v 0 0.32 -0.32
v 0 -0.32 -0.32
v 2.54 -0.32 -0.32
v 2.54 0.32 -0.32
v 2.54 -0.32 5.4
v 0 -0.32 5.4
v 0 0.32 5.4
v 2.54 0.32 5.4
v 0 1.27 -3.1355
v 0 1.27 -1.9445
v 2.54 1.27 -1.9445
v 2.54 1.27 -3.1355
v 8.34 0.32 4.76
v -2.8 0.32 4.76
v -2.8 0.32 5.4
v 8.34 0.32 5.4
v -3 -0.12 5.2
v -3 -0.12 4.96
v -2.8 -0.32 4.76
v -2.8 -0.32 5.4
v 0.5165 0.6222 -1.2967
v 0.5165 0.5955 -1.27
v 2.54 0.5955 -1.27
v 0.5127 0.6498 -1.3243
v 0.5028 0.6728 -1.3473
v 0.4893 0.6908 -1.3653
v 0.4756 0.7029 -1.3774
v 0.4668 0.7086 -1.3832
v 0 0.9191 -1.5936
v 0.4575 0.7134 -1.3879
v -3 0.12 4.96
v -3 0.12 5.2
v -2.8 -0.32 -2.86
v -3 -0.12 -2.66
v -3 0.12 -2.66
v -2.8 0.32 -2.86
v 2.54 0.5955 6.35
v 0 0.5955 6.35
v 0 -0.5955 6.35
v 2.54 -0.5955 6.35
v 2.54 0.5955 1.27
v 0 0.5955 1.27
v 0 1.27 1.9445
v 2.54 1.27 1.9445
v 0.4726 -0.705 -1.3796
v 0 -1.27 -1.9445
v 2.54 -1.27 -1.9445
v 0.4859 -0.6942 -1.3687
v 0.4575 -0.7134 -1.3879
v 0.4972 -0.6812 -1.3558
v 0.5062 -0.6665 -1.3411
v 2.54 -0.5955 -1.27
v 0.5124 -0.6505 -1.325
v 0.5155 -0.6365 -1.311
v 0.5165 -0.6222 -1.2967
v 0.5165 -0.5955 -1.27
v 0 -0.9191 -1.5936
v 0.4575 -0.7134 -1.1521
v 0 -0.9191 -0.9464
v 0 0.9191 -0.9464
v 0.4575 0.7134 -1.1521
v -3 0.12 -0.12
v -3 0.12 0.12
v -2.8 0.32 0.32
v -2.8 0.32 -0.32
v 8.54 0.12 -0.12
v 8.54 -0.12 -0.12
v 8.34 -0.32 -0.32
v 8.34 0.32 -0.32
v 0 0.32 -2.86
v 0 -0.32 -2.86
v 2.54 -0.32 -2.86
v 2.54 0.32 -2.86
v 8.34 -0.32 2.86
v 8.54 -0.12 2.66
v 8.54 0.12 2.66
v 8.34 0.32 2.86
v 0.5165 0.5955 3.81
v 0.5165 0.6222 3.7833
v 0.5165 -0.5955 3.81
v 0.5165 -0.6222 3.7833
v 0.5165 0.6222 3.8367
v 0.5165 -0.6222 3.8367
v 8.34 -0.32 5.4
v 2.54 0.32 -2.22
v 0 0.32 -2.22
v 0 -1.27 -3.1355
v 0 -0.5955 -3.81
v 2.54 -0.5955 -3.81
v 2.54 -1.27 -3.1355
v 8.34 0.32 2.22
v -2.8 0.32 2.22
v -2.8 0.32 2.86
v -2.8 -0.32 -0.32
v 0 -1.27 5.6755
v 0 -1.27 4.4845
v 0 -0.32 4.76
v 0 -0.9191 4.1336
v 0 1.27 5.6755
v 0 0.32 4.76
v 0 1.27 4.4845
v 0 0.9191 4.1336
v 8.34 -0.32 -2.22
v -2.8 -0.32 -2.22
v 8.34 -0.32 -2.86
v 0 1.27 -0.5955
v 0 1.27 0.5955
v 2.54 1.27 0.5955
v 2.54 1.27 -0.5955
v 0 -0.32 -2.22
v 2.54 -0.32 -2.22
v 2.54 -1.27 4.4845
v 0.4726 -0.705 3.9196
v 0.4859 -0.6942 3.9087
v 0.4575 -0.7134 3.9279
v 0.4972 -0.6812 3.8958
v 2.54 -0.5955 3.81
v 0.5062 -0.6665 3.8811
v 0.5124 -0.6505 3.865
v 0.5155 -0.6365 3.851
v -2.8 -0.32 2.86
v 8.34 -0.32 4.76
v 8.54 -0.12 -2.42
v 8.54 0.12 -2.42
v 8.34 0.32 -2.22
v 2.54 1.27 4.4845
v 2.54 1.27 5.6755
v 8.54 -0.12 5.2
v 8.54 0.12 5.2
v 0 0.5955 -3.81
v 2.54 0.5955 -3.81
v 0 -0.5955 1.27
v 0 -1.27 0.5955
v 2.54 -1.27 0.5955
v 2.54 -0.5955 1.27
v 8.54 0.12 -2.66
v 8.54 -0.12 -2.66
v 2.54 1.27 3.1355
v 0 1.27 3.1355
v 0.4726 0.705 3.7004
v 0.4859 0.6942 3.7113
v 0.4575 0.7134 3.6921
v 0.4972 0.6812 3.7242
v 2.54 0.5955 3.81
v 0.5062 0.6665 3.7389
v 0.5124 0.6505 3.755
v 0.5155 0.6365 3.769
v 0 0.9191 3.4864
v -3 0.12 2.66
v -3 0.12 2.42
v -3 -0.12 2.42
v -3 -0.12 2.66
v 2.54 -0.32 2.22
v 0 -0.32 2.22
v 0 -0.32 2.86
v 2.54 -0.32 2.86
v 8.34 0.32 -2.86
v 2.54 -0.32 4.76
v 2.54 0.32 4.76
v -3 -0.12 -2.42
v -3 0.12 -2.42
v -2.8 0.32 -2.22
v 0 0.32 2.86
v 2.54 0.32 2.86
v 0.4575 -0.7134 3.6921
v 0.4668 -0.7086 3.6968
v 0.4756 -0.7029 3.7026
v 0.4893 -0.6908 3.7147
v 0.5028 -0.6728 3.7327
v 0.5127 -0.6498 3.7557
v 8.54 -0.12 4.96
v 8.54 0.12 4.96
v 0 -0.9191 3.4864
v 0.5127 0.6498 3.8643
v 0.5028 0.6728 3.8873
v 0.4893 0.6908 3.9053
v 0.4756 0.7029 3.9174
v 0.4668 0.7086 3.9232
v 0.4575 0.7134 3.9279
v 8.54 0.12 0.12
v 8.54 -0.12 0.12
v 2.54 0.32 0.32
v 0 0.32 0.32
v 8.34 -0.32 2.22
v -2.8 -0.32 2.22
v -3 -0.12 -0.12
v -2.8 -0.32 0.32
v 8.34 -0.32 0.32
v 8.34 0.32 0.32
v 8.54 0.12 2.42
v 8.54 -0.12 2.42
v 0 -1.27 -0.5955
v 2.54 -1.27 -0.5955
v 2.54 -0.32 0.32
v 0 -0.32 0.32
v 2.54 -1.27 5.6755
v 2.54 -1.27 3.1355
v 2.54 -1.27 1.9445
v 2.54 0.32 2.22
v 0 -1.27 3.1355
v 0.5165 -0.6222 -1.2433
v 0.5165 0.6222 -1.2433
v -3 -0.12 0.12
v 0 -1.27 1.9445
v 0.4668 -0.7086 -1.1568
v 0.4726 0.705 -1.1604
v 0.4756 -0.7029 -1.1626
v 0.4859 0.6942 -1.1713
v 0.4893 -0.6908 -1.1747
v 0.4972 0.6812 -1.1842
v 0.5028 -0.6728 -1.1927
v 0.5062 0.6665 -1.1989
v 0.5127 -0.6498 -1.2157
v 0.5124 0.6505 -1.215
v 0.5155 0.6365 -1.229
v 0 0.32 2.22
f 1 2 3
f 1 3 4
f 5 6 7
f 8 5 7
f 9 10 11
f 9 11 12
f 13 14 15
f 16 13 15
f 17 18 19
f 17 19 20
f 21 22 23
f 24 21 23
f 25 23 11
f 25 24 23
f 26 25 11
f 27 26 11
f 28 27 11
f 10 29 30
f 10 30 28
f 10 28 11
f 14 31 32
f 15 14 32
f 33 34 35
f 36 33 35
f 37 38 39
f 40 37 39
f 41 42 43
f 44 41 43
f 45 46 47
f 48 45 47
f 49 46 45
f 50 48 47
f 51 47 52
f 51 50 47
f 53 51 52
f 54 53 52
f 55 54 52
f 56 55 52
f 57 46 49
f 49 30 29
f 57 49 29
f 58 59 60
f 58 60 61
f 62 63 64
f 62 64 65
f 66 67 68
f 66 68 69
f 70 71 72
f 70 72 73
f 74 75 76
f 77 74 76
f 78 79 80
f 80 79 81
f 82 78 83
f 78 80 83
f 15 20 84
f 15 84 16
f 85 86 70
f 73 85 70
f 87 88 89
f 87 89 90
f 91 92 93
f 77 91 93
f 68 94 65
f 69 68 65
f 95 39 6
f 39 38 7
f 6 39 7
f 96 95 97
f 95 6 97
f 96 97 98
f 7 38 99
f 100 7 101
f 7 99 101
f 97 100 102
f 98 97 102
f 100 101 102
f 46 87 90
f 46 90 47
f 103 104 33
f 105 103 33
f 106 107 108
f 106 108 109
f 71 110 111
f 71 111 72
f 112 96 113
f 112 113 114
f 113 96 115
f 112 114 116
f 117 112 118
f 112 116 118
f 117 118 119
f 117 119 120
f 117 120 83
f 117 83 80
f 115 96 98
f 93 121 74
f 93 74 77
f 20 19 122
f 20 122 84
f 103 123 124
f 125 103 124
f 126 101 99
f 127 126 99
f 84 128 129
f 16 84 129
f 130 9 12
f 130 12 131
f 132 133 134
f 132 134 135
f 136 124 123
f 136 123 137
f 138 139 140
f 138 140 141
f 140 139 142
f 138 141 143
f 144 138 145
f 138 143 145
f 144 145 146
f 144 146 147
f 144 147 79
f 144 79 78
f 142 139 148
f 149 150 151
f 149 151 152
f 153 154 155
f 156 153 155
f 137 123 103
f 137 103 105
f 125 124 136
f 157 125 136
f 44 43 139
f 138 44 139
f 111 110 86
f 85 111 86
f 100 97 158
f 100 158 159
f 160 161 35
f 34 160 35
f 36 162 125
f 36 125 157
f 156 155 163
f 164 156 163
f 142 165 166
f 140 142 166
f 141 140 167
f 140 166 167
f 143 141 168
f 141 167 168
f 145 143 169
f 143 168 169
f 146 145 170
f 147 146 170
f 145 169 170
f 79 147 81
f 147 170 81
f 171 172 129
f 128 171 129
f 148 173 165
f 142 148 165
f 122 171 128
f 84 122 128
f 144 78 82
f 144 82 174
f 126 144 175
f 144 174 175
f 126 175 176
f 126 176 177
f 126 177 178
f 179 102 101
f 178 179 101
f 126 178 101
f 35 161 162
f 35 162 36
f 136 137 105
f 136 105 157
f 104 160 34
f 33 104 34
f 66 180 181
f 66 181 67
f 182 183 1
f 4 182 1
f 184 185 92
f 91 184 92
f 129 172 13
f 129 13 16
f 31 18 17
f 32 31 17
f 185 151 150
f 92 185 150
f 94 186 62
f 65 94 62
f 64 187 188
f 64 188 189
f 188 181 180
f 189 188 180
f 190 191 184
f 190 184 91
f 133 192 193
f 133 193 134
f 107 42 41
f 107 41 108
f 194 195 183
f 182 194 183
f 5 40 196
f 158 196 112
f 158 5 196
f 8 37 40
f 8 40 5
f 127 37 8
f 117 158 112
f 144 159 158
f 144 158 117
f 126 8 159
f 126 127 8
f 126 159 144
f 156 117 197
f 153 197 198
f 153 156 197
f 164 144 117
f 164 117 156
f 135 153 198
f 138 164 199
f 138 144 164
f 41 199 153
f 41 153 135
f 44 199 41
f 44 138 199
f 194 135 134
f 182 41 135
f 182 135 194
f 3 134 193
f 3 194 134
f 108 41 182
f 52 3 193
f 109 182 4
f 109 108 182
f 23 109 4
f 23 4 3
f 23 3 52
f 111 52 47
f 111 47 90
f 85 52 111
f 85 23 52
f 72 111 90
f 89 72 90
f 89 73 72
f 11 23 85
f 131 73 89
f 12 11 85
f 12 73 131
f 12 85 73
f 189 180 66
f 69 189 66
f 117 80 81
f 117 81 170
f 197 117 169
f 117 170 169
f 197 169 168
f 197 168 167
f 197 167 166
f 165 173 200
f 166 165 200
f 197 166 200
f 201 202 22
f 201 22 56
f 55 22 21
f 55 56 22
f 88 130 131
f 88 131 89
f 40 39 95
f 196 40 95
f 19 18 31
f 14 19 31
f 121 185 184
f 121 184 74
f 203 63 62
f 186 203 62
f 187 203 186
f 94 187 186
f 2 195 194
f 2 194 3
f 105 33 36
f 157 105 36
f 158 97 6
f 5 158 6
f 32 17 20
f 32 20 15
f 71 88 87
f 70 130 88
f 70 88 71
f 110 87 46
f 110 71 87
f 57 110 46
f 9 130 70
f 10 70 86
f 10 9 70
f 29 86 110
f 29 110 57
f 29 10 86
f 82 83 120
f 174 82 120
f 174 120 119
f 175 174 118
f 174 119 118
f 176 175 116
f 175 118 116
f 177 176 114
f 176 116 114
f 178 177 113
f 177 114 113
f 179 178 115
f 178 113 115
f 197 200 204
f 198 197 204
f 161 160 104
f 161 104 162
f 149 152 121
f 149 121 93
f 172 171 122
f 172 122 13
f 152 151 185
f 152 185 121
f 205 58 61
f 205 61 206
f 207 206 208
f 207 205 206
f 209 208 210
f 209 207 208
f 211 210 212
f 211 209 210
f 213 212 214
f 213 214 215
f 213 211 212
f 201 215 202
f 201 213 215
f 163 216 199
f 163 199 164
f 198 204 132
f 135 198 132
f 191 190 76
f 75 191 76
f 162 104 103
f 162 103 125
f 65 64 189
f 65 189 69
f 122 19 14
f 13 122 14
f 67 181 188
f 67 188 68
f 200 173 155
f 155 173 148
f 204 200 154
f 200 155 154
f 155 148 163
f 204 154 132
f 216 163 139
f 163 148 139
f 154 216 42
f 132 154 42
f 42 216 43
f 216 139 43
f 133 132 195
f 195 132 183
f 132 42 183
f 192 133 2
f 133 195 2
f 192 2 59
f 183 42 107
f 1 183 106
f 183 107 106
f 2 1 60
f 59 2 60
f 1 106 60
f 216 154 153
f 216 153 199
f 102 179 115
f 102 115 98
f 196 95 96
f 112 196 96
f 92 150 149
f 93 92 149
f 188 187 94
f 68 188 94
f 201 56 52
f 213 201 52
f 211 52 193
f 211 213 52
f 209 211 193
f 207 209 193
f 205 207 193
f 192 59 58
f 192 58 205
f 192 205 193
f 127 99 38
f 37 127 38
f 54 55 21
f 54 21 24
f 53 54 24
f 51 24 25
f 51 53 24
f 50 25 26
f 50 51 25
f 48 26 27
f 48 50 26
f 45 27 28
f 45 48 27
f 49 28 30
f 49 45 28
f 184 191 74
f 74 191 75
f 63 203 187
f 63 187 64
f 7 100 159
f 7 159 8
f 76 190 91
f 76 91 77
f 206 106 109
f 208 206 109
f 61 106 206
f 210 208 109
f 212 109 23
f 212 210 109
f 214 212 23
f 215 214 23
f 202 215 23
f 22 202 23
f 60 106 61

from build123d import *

# Parameters (mm, degrees)
CROQUIS1_W                     = 0.64
CROQUIS1_H                     = 0.64
SALIENTE_EXTRUIR1_DEPTH        = 2.54
CORTAR_EXTRUIR1_DEPTH          = 2.54
CORTAR_EXTRUIR1_DEPTH_BACK     = 2.54
SALIENTE_EXTRUIR2_DEPTH        = 8.54
SALIENTE_EXTRUIR2_DEPTH_BACK   = 3
CROQUIS3_W                     = 0.64
CROQUIS3_H                     = 0.64
SALIENTE_EXTRUIR2_2_DEPTH      = 8.54
SALIENTE_EXTRUIR2_2_DEPTH_BACK = 3
CHAFL_N1_SIZE                  = 0.2
CHAFL_N2_SIZE                  = 0.2


with BuildPart() as part:
    # Croquis1 → Saliente-Extruir1 (new body)
    # profile 1 of 2: a face of its own
    with BuildSketch(Plane(origin=(0, 0, 0), x_dir=(0, 0, -1), z_dir=(1, 0, 0))):
        Polygon((1.27, 0.595482683), (1.27, -0.595482683), (0.595482683, -1.27), (-0.595482683, -1.27), (-1.27, -0.595482683), (-1.27, 0.595482683), (-0.595482683, 1.27), (0.595482683, 1.27), align=None)
        Rectangle(CROQUIS1_W, CROQUIS1_H, mode=Mode.SUBTRACT)
    # profile 2 of 2: a face of its own
    with BuildSketch(Plane(origin=(0, 0, 0), x_dir=(0, 0, -1), z_dir=(1, 0, 0))):
        Polygon((3.135482683, 1.27), (3.81, 0.595482683), (3.81, -0.595482683), (3.135482683, -1.27), (1.944517317, -1.27), (1.27, -0.595482683), (1.27, 0.595482683), (1.944517317, 1.27), align=None)
        with Locations((2.54, 0)):
            Rectangle(CROQUIS1_W, CROQUIS1_H, mode=Mode.SUBTRACT)
    extrude(amount=SALIENTE_EXTRUIR1_DEPTH)

    # Croquis2 → Cortar-Extruir1 (cut, two sides: drawn at the far end of the back side and taken through both)
    with BuildSketch(Plane(origin=(0, 0, 0), x_dir=(1, 0, 0), z_dir=(0, 1, 0)).offset(-CORTAR_EXTRUIR1_DEPTH_BACK)):
        with BuildLine():
            Line((0.516526244, 1.243275937), (0.516526244, 1.296724063))
            ThreePointArc((0.516526244, 1.296724063), (0.500491193, 1.351036929), (0.457528496, 1.387931603))
            Line((0.457528496, 1.387931603), (0, 1.593613049))
            Line((0, 1.593613049), (0, 0.946386951))
            Line((0, 0.946386951), (0.457528496, 1.152068397))
            ThreePointArc((0.457528496, 1.152068397), (0.500491193, 1.188963071), (0.516526244, 1.243275937))
        make_face()
    extrude(amount=CORTAR_EXTRUIR1_DEPTH + CORTAR_EXTRUIR1_DEPTH_BACK, mode=Mode.SUBTRACT)

    # Mirror5: part across plane


with BuildPart() as body_2:
    # Croquis3 → Saliente-Extruir2 (new, two sides: drawn at the far end of the back side and taken through both)
    with BuildSketch(Plane(origin=(0, 0, 0), x_dir=(0, 0, -1), z_dir=(1, 0, 0)).offset(-SALIENTE_EXTRUIR2_DEPTH_BACK)):
        Rectangle(CROQUIS3_W, CROQUIS3_H)
    extrude(amount=SALIENTE_EXTRUIR2_DEPTH + SALIENTE_EXTRUIR2_DEPTH_BACK)

    # Chaflán1
    chafl_n1_edges = [body_2.edges().sort_by_distance(p)[0] for p in [
        (-3, 0, -0.32),
        (8.54, 0, 0.32),
        (8.54, -0.32, 0),
        (-3, 0.32, 0),
        (8.54, 0, -0.32),
        (8.54, 0.32, 0),
        (-3, 0, 0.32),
        (-3, -0.32, 0),
    ]]
    chamfer(chafl_n1_edges, length=CHAFL_N1_SIZE)


with BuildPart() as body_3:
    # Croquis3 → Saliente-Extruir2 2 (new, two sides: drawn at the far end of the back side and taken through both)
    with BuildSketch(Plane(origin=(0, 0, 0), x_dir=(0, 0, -1), z_dir=(1, 0, 0)).offset(-SALIENTE_EXTRUIR2_2_DEPTH_BACK)):
        with Locations((2.54, 0)):
            Rectangle(CROQUIS3_W, CROQUIS3_H)
    extrude(amount=SALIENTE_EXTRUIR2_2_DEPTH + SALIENTE_EXTRUIR2_2_DEPTH_BACK)

    # Chaflán2
    chafl_n2_edges = [body_3.edges().sort_by_distance(p)[0] for p in [
        (-3, 0, -2.86),
        (8.54, 0, -2.22),
        (8.54, -0.32, -2.54),
        (-3, 0.32, -2.54),
        (8.54, 0, -2.86),
        (8.54, 0.32, -2.54),
        (-3, 0, -2.22),
        (-3, -0.32, -2.54),
    ]]
    chamfer(chafl_n2_edges, length=CHAFL_N2_SIZE)


with BuildPart() as body_4:
    # Mirror3: mirrored copy
    add(body_2.part.mirror(Plane(origin=(2.54, 0, 1.27), x_dir=(1, 0, 0), z_dir=(0, 0, -1))))


with BuildPart() as body_5:
    # Mirror3 2: mirrored copy
    add(body_3.part.mirror(Plane(origin=(2.54, 0, 1.27), x_dir=(1, 0, 0), z_dir=(0, 0, -1))))


with BuildPart() as part_1:
    add(part.part)
    add(part.part.mirror(Plane(origin=(2.54, 0, 1.27), x_dir=(1, 0, 0), z_dir=(0, 0, -1))))


solid = Compound([body_2.part, body_3.part, body_4.part, body_5.part, part_1.part])
